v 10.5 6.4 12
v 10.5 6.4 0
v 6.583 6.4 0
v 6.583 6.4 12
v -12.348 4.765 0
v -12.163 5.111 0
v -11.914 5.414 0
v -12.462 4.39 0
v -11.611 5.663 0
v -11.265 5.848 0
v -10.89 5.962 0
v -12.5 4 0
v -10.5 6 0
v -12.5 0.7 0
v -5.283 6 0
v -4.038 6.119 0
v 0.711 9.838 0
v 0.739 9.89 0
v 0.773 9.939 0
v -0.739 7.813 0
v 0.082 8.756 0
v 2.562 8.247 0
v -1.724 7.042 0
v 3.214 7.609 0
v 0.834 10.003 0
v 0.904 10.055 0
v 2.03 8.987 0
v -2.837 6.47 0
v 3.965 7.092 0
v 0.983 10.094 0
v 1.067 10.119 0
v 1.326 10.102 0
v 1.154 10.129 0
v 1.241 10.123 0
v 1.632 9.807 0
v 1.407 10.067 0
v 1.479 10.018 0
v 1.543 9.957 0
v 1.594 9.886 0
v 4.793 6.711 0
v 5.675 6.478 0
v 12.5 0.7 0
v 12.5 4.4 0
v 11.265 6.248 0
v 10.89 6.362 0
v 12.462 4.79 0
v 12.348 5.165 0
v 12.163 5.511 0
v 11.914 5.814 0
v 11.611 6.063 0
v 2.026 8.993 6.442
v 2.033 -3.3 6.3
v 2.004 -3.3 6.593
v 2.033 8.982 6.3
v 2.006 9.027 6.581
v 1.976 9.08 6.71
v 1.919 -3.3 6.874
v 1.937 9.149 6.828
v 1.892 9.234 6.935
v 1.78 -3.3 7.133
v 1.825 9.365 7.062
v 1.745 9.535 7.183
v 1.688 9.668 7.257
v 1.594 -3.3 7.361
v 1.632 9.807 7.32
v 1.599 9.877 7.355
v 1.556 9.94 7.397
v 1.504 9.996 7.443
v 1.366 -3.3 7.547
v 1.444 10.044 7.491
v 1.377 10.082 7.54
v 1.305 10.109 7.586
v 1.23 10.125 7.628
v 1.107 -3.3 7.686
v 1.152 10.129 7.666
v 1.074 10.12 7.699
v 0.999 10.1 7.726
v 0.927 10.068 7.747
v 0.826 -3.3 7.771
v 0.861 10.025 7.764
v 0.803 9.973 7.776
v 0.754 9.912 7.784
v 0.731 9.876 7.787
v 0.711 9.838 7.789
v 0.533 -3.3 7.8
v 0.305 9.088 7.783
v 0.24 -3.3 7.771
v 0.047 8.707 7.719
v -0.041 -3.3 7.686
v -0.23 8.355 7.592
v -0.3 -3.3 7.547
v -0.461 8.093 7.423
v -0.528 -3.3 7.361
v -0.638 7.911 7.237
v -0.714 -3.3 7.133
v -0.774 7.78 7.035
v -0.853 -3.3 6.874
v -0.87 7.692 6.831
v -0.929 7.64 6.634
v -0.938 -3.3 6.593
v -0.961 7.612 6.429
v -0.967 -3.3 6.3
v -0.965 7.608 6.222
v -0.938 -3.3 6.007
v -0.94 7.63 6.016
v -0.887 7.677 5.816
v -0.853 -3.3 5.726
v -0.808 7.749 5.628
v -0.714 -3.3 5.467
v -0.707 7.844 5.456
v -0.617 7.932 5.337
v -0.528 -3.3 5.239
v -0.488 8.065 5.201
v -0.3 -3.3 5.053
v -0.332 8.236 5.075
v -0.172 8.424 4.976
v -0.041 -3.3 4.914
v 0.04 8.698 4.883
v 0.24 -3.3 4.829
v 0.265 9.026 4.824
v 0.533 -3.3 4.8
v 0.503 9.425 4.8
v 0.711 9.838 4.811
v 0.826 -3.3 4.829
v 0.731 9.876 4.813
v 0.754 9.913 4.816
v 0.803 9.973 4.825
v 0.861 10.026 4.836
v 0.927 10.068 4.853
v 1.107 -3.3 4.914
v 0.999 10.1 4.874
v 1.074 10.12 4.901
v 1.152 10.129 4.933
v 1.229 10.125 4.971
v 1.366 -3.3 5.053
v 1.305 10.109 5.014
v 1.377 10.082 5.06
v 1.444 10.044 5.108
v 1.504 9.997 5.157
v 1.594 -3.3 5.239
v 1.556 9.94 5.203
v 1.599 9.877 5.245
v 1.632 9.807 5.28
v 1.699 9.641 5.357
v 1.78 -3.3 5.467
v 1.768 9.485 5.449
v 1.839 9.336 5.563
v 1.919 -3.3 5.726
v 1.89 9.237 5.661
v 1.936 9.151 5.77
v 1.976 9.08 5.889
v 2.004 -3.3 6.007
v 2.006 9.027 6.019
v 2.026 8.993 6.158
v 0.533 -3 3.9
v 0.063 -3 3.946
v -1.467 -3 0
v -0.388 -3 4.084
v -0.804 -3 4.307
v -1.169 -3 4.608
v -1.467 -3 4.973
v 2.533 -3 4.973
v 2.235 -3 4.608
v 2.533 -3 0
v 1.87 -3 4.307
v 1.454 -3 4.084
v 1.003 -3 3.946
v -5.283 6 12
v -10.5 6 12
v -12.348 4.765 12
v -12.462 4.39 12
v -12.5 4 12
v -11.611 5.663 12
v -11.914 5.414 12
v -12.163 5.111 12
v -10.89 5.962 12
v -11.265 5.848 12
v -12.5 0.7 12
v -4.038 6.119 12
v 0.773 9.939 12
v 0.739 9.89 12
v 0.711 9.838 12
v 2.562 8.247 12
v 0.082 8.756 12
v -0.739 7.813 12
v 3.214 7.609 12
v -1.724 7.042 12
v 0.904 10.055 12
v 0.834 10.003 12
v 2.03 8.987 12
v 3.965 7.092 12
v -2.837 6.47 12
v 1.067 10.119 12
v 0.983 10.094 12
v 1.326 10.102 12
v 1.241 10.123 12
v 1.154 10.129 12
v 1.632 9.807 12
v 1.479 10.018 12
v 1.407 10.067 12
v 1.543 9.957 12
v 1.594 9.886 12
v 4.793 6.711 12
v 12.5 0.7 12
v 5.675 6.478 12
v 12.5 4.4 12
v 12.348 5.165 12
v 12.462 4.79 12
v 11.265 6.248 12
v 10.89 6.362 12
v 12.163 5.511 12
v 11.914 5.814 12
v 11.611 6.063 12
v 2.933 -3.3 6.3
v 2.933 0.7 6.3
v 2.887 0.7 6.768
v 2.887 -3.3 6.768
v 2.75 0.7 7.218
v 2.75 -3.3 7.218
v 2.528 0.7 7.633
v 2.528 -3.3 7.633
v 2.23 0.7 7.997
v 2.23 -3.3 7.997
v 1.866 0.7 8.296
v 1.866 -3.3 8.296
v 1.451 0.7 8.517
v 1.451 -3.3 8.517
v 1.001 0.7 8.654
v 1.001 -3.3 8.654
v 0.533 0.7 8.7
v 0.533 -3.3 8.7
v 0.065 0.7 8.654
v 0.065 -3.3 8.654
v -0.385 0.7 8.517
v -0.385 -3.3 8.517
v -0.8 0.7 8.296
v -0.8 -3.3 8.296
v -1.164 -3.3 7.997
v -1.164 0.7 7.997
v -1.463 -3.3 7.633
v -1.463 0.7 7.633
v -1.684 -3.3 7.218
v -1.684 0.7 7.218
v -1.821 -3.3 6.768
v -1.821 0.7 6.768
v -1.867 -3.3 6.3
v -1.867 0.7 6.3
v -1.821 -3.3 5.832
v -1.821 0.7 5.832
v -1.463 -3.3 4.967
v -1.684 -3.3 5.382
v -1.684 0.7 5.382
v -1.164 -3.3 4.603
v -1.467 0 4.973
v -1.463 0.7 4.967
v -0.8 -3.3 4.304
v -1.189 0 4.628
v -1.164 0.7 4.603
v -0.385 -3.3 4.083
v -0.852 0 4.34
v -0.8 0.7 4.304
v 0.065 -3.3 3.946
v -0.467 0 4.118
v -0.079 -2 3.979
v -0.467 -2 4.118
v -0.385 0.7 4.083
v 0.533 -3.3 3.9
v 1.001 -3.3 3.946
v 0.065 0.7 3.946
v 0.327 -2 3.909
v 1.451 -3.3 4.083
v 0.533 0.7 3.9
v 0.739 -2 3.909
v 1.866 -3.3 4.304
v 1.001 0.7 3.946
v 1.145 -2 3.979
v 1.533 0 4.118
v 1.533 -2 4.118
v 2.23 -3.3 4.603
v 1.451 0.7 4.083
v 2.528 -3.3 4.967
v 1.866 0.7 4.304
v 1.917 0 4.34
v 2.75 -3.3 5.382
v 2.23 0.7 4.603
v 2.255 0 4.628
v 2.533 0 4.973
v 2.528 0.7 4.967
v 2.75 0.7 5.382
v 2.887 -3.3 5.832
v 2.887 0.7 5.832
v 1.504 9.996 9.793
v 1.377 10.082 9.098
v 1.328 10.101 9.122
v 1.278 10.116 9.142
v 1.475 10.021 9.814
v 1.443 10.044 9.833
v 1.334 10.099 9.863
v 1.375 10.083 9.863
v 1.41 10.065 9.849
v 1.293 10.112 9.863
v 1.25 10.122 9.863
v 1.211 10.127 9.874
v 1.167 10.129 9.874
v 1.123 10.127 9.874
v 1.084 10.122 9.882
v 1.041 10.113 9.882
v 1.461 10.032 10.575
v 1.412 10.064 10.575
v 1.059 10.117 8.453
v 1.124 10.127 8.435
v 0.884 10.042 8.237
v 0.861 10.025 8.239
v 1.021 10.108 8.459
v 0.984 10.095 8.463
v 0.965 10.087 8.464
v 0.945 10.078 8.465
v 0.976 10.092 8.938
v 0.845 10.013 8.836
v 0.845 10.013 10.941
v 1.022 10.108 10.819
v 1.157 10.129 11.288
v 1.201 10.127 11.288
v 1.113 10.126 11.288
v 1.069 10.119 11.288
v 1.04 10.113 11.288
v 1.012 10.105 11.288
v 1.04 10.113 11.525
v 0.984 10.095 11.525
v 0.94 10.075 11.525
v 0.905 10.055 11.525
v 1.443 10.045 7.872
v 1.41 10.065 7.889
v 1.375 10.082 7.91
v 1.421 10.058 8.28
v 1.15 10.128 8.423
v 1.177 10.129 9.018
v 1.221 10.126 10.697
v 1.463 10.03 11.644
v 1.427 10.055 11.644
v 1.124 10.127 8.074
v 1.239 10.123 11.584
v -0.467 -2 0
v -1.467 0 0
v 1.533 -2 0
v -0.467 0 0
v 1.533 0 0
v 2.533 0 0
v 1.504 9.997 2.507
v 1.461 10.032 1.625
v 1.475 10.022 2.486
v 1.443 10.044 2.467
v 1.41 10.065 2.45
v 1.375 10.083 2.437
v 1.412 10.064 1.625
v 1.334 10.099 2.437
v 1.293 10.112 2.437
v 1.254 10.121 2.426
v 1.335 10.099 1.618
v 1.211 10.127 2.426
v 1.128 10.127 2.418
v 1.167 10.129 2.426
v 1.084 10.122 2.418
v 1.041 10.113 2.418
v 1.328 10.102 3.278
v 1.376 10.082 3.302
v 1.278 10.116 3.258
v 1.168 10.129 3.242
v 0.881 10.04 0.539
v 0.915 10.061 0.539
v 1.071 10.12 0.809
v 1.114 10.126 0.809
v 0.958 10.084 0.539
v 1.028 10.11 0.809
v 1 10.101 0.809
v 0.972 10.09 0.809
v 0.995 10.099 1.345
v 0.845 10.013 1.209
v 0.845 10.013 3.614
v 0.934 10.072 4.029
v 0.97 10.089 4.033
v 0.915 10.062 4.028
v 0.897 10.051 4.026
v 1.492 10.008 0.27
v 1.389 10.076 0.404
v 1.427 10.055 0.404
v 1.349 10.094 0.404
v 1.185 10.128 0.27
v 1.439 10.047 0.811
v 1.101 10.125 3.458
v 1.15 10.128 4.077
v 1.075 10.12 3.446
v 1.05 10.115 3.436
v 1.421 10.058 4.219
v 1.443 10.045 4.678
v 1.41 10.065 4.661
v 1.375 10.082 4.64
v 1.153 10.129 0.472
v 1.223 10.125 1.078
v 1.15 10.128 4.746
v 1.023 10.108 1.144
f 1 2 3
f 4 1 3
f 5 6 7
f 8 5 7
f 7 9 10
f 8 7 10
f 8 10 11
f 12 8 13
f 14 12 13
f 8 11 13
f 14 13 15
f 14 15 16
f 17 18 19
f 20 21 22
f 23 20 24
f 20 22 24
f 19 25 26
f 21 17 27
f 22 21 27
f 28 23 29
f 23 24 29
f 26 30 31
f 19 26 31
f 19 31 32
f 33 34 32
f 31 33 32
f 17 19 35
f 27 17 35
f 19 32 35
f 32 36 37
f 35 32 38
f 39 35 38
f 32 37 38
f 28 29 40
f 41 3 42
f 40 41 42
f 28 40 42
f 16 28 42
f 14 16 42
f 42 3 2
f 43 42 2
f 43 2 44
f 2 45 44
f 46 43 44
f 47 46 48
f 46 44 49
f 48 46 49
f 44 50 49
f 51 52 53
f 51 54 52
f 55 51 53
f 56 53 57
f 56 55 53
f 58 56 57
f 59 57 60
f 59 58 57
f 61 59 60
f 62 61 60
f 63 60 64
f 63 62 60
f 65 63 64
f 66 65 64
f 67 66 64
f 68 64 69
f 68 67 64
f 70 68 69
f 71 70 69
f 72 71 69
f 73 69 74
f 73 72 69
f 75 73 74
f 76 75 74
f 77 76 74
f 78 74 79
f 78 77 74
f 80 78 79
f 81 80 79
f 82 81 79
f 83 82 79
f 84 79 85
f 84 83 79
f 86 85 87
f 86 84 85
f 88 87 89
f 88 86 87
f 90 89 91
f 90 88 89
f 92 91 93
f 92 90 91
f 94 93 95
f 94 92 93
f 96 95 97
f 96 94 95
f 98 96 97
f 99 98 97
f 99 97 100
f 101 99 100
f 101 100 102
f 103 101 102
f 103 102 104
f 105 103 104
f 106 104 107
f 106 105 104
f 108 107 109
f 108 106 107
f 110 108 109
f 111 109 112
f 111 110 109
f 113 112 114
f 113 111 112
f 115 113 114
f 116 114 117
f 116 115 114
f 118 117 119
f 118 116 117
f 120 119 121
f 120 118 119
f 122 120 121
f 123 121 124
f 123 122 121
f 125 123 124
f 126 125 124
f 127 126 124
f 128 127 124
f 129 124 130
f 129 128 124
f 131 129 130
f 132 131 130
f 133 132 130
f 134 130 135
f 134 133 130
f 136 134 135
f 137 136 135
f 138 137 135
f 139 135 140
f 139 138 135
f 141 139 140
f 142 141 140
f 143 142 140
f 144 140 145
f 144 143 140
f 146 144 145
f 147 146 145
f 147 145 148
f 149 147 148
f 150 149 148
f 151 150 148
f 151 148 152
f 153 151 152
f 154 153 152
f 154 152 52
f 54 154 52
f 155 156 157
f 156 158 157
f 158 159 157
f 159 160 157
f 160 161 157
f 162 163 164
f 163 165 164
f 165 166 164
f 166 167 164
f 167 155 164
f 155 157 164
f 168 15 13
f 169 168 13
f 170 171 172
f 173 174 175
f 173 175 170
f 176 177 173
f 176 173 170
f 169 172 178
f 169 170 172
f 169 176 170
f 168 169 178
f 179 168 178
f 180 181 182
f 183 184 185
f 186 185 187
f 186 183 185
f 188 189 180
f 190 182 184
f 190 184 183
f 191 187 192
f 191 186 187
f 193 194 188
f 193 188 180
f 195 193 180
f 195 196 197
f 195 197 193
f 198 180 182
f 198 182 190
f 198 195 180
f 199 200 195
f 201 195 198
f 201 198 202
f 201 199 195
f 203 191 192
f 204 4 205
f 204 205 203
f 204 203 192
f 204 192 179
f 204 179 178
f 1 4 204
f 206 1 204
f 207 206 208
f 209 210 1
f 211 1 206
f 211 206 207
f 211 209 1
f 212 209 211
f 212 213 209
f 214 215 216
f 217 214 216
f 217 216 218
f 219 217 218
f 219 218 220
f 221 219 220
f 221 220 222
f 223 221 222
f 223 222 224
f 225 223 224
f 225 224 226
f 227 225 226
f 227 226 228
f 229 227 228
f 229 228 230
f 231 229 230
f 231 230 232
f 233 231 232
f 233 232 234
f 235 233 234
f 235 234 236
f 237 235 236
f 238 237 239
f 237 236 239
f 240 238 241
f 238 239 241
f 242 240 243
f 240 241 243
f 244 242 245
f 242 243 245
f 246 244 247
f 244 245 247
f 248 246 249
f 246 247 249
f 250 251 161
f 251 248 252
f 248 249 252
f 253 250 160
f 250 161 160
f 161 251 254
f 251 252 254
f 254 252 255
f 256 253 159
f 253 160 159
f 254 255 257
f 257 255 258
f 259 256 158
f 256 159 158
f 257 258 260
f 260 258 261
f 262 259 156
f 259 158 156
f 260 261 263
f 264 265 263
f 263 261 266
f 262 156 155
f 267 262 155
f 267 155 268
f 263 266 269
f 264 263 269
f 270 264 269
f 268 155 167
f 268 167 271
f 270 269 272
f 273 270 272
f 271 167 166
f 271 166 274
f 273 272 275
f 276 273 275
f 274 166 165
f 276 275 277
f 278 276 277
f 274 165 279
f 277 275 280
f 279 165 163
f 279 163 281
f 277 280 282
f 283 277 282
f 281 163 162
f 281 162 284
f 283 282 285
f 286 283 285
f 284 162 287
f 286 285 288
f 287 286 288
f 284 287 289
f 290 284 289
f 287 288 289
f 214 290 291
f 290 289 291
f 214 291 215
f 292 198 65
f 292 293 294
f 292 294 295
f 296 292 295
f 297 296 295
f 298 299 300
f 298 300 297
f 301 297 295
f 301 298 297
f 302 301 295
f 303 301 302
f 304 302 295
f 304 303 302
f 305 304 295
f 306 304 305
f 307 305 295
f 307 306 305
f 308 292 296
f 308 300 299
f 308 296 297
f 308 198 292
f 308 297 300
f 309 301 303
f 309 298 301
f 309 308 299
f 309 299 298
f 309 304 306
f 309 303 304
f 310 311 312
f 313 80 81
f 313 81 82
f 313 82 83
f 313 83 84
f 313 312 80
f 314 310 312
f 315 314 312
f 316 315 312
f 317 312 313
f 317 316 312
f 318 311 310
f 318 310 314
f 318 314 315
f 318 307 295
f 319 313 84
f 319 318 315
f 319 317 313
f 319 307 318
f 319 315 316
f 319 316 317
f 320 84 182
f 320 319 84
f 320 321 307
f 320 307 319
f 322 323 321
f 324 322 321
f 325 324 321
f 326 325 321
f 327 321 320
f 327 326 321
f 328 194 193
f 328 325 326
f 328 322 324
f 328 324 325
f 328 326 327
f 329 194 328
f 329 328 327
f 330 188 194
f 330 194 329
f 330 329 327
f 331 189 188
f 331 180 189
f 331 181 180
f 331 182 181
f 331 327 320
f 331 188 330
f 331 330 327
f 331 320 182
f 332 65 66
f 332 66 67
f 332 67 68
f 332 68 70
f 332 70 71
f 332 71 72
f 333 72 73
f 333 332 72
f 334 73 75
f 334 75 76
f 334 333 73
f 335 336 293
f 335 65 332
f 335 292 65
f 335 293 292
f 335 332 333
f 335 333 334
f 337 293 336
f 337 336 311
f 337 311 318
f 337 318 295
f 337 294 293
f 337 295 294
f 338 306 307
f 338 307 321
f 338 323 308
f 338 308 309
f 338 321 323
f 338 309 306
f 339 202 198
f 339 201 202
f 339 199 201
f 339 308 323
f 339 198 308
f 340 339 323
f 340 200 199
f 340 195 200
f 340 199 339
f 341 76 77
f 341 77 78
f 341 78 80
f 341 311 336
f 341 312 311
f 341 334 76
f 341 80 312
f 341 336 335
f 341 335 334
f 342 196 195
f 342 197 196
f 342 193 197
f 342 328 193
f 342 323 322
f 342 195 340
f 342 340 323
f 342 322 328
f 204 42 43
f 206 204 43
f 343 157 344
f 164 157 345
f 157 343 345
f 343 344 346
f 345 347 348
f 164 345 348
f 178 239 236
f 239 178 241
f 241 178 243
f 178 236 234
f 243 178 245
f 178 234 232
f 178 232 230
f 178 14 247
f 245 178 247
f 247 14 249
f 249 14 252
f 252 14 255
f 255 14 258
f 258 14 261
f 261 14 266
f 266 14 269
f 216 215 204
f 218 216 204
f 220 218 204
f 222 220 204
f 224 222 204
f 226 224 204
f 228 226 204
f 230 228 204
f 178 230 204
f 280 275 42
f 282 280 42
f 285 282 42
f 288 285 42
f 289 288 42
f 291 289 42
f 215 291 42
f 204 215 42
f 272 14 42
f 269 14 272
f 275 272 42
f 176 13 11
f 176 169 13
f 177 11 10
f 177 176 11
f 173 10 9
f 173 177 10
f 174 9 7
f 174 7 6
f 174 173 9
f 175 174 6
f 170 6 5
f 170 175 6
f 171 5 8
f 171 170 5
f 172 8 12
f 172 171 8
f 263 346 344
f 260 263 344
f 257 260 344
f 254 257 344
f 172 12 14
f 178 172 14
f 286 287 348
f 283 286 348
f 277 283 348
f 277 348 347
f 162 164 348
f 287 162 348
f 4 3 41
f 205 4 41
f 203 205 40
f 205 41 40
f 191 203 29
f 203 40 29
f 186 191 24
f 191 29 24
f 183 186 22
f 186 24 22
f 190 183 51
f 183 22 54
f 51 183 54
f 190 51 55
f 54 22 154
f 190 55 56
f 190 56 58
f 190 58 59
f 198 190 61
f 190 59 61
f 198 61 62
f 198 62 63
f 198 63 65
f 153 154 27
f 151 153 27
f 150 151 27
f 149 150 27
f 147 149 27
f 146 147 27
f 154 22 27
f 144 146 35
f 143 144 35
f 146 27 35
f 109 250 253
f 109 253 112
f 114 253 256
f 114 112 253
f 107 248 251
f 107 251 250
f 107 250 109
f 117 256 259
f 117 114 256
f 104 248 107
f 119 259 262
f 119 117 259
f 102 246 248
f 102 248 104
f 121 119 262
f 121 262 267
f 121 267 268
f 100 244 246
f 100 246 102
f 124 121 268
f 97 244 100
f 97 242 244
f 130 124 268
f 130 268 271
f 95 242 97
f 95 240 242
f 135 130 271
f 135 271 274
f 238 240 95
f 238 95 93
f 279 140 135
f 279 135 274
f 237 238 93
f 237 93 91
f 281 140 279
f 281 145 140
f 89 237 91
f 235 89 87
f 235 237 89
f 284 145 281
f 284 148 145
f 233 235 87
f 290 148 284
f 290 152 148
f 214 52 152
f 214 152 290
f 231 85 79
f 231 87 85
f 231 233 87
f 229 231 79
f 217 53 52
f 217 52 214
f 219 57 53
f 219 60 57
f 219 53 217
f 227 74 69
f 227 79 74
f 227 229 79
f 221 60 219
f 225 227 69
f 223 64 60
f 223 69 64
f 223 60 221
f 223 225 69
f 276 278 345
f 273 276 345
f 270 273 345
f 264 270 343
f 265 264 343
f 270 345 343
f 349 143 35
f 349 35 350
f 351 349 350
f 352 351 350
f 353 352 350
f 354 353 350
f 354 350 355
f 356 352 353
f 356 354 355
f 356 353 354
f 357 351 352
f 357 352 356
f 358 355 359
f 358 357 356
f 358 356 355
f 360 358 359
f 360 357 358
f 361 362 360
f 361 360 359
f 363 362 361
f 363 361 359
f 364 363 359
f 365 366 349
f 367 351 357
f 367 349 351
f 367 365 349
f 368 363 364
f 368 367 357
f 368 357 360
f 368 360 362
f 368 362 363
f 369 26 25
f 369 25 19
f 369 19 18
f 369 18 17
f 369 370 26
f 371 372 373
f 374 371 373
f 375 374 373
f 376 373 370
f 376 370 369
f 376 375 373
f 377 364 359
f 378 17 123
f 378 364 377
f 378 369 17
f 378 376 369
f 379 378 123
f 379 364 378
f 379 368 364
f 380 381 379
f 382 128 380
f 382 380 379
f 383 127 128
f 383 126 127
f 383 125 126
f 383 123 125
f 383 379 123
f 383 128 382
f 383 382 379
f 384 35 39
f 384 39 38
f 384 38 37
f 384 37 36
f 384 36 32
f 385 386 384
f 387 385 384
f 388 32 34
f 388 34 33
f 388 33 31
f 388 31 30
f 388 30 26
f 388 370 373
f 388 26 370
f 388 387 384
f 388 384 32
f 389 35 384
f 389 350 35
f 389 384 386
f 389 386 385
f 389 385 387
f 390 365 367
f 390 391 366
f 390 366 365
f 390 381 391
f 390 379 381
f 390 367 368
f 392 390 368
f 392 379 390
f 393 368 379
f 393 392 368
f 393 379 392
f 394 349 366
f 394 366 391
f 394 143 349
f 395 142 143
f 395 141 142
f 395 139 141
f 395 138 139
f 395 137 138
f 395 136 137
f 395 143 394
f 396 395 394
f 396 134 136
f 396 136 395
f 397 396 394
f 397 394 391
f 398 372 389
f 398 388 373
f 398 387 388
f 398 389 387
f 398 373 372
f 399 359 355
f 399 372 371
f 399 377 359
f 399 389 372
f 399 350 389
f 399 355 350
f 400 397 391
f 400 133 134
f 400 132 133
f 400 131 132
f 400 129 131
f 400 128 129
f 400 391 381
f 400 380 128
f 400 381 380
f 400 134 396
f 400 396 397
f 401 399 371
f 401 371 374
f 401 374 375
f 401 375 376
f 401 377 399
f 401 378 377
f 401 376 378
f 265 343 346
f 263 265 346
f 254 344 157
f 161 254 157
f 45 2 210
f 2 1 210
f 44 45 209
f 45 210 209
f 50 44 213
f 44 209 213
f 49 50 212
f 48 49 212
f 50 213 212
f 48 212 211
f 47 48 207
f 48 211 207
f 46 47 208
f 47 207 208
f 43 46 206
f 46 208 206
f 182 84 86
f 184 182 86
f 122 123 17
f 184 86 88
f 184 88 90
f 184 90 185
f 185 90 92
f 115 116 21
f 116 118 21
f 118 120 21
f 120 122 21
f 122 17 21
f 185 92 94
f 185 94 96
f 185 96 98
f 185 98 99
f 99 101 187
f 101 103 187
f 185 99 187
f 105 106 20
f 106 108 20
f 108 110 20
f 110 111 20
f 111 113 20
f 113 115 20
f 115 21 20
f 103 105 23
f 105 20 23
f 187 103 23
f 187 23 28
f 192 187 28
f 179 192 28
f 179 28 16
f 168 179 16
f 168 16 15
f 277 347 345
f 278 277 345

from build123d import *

# Parameters (mm, degrees)
F1_DEPTH = 12
F2_R     = 1.5
F3_DEPTH = 25
F4_R     = 0.5
F5_R     = 2
F2_R_2   = 2.4
F6_DEPTH = 4


# Not quite as in the source:
# - a feature names something its author has since deleted; it is built from what else it names


with BuildPart() as f1:
    # F0 (on Top) → F1 (new body)
    with BuildSketch(Plane.XY):
        with BuildLine():
            Line((12.5, 6.4), (6.5829587897, 6.4))
            ThreePointArc((6.5829587897, 6.4), (2.6961571623, 8.0968384564), (1.2981383552, 12.100840336))
            ThreePointArc((1.2981383552, 12.100840336), (-0.7960029052, 7.7598319357), (-5.2829587897, 6))
            Line((-5.2829587897, 6), (-12.5, 6))
            Line((-12.5, 6), (-12.5, 0.7))
            Line((-12.5, 0.7), (12.5, 0.7))
            Line((12.5, 0.7), (12.5, 6.4))
        make_face()
    extrude(amount=F1_DEPTH)

    # F2 (on face) → F3 (cut)
    with BuildSketch(Plane.XZ.offset(-0.7)):
        with Locations((0.5329587897, 6.3)):
            Circle(F2_R)
    extrude(amount=-F3_DEPTH, mode=Mode.SUBTRACT)

    # F4
    f4_edges = [f1.edges().sort_by_distance(p)[0] for p in [
        (1.298138, 12.10084, 9.795078),
        (1.298138, 12.10084, 2.504922),
    ]]
    fillet(f4_edges, radius=F4_R)

    # F5
    f5_edges = [f1.edges().sort_by_distance(p)[0] for p in [
        (-12.5, 6, 6),
        (12.5, 6.4, 6),
    ]]
    fillet(f5_edges, radius=F5_R)

    # F2 (on face) → F6 (join)
    with BuildSketch(Plane.XZ.offset(-0.7)):
        with Locations((0.5329587897, 6.3)):
            Circle(F2_R_2)
        with Locations((0.5329587897, 6.3)):
            Circle(F2_R, mode=Mode.SUBTRACT)
    extrude(amount=F6_DEPTH)

    # F0 (on Top) → F7 (join, up to the next surface of F1)
    with BuildSketch(Plane.XY):
        Polygon((-0.4670412103, 0), (-1.4670412103, 0), (-1.4670412103, -2), (-1.4670412103, -3), (2.5329587897, -3), (2.5329587897, -2), (2.5329587897, 0), (1.5329587897, 0), (1.5329587897, -2), (-0.4670412103, -2), align=None)
    extrude(until=Until.NEXT)


solid = f1.part
